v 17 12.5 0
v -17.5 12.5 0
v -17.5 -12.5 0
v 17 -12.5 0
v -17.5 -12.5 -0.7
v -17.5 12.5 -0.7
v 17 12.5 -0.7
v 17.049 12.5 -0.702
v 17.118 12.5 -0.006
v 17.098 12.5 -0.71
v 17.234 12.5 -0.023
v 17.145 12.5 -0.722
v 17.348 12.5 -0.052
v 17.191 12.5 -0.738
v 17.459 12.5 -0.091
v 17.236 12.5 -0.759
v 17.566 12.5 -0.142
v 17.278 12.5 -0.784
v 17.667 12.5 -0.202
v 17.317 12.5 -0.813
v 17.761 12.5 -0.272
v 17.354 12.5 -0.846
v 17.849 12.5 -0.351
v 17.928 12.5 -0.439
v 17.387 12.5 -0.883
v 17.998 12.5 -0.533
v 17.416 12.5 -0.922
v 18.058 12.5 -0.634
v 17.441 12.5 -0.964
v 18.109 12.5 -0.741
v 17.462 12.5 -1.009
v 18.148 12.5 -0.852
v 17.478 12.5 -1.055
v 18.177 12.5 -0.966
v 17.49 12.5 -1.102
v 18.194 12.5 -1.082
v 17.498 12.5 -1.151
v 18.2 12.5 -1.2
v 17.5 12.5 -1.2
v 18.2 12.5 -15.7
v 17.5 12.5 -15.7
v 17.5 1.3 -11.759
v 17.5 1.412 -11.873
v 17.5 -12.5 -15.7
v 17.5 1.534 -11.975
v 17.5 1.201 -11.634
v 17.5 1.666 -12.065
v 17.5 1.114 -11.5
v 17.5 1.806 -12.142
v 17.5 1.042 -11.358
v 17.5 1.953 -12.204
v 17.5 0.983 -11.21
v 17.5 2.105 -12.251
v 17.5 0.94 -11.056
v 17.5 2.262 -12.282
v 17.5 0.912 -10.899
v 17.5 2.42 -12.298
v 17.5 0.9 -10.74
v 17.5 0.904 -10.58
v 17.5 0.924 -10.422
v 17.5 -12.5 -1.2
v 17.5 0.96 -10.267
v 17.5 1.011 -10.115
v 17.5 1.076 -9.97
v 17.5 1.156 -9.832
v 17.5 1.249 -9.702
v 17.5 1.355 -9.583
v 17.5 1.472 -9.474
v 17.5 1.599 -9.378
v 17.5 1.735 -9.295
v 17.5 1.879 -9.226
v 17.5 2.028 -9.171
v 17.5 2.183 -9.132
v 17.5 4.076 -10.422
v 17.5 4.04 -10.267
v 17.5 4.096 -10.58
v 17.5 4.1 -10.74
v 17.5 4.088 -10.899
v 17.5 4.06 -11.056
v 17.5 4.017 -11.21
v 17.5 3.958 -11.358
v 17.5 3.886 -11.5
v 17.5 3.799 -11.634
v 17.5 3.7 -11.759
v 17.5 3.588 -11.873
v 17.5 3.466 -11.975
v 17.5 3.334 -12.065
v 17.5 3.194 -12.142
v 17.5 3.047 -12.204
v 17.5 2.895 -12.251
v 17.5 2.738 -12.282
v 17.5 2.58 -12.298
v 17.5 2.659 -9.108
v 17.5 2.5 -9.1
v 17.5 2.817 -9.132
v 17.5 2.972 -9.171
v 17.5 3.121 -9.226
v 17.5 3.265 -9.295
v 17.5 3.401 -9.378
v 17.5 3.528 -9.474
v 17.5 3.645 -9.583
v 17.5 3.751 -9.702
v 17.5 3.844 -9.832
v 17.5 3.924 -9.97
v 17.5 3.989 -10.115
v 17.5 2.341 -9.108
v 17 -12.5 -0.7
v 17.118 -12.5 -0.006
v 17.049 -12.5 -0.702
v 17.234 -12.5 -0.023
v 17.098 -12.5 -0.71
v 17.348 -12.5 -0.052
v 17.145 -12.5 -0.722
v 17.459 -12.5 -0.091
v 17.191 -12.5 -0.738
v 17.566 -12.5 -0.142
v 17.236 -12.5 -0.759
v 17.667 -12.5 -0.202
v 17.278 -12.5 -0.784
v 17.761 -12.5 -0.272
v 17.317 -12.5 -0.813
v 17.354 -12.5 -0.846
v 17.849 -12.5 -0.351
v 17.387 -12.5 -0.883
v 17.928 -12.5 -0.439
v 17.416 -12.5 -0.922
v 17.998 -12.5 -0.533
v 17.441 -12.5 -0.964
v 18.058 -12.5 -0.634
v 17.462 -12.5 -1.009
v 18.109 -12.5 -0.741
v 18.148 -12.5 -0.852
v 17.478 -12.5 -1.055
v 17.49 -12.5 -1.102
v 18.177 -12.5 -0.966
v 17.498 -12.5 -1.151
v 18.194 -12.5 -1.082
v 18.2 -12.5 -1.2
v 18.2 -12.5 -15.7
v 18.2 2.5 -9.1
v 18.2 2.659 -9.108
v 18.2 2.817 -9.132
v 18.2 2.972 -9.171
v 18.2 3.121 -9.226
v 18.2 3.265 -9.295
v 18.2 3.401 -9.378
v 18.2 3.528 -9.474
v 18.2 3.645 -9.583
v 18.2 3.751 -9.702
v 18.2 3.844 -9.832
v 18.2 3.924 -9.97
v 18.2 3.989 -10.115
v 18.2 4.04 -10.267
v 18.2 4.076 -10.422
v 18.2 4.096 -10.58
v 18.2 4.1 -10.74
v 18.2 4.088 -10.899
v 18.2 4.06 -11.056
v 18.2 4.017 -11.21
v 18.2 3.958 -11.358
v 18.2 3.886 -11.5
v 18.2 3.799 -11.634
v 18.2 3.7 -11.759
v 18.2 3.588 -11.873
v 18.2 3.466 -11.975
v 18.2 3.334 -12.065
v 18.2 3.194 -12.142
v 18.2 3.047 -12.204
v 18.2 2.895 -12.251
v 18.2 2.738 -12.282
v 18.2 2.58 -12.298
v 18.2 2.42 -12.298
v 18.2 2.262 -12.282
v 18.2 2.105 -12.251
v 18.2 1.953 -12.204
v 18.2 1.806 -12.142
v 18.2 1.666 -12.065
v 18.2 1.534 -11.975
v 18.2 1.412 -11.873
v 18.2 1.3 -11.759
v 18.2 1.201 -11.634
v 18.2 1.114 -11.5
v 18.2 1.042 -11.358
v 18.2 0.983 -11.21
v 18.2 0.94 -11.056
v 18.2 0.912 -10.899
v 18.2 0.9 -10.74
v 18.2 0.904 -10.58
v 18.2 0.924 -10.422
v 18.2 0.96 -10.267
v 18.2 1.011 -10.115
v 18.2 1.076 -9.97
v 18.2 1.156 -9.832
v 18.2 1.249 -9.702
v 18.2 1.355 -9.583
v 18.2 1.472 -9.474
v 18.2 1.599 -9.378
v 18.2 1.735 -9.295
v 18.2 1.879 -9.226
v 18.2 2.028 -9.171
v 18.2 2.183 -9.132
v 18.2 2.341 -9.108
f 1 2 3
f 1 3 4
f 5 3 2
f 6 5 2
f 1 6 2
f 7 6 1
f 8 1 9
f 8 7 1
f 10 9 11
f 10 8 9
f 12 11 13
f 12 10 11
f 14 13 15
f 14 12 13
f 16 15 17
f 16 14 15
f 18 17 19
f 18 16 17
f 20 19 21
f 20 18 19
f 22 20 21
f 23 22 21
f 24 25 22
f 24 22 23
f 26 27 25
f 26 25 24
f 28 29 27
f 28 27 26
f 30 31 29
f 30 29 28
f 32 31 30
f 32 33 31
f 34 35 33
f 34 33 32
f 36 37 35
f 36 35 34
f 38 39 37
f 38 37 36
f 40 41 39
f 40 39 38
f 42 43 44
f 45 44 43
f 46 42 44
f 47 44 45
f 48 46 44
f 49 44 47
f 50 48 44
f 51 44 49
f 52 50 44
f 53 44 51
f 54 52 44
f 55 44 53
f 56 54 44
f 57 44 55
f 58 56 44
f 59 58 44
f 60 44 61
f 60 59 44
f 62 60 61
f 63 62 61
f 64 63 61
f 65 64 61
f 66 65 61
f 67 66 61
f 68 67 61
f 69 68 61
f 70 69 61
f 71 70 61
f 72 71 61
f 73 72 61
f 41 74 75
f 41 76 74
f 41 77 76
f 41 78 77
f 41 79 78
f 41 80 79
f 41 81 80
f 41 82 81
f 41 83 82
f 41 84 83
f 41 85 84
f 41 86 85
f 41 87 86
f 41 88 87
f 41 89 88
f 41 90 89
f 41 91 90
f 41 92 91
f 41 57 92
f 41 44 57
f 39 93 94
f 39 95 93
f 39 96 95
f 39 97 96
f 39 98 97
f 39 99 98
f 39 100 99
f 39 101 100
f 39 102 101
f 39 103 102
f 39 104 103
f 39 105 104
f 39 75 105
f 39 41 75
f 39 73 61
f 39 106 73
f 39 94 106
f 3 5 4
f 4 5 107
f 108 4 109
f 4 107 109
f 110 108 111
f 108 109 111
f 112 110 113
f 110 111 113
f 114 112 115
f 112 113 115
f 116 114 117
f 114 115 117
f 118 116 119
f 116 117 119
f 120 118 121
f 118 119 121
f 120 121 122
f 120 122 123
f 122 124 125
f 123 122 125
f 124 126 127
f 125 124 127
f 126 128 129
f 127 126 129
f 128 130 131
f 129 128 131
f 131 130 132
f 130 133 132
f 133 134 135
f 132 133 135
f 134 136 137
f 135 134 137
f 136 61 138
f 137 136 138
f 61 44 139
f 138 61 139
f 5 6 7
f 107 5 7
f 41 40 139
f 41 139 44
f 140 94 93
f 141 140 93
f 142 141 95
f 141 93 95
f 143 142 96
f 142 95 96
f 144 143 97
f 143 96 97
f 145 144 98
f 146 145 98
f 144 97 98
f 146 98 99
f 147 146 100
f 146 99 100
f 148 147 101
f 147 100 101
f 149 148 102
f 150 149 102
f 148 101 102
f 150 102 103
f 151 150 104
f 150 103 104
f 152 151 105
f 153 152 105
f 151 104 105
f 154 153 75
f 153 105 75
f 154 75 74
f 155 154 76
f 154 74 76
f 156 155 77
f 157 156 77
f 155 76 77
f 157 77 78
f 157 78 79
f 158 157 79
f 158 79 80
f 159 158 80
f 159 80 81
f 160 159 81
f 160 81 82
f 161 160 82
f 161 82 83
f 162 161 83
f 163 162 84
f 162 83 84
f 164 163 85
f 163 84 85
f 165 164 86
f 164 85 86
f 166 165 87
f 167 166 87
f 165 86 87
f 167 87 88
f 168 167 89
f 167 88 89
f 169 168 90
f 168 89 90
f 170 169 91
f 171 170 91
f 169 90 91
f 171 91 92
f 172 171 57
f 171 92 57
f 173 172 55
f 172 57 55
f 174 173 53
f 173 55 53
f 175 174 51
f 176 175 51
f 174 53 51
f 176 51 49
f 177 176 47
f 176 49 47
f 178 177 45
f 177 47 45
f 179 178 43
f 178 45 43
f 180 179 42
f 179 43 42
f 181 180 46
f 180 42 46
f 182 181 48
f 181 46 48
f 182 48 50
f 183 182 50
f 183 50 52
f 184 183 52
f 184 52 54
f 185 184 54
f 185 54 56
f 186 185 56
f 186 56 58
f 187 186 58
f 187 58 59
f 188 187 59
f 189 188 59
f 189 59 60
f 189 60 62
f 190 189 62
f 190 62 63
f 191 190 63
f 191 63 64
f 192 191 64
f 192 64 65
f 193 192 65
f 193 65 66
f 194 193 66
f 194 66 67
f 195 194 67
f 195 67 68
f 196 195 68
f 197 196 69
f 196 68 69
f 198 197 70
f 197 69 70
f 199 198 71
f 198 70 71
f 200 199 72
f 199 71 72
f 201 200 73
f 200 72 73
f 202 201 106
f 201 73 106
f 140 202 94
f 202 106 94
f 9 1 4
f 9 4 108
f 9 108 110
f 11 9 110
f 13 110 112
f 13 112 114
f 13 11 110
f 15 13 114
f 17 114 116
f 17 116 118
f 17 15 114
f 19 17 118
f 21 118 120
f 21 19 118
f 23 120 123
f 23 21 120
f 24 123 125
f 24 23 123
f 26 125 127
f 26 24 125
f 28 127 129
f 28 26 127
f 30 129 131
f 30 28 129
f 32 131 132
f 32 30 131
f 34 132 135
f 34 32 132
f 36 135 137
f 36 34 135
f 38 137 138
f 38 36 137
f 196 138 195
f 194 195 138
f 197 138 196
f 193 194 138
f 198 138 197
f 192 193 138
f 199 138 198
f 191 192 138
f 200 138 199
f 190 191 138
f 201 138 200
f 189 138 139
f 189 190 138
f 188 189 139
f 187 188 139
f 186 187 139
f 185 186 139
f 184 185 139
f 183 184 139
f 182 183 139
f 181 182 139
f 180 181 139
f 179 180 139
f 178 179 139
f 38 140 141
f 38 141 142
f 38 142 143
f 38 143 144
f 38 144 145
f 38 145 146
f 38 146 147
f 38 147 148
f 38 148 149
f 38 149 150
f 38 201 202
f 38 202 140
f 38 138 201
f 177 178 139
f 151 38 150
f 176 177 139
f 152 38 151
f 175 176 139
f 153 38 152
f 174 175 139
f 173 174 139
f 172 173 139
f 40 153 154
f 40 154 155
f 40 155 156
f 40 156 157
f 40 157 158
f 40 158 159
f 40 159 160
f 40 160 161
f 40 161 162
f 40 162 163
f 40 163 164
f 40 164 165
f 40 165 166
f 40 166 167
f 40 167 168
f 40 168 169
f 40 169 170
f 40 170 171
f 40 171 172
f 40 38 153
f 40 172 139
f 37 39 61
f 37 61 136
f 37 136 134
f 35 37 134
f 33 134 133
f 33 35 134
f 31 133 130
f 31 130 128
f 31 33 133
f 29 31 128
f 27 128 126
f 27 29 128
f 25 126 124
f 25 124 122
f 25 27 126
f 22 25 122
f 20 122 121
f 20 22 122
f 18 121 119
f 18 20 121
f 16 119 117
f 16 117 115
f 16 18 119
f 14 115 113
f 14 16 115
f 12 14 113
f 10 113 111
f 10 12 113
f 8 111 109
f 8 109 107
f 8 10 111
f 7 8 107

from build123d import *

# Parameters (mm, degrees)
SKETCH1_W                    = 35
SKETCH1_H                    = 25
BASE_FLANGE1_DEPTH           = 0.7
EDGE_FLANGE1_STRIP_W         = 3.8
EDGE_FLANGE1_STRIP_H         = 0.7
EDGE_FLANGE1_STRIP_CUT_DEPTH = 25
EDGE_FLANGE1_DEPTH           = 25
SKETCH10_R                   = 1.6
CUT_EXTRUDE1_DEPTH           = 0.7


# Sheet-metal steps are written as plain solids
with BuildPart() as part:
    # Sketch1 → Base-Flange1 (new body)
    with BuildSketch(Plane.XY):
        Rectangle(SKETCH1_W, SKETCH1_H)
    extrude(amount=-BASE_FLANGE1_DEPTH)

    # Edge-Flange1 strip (across the edge) → Edge-Flange1 strip cut (cut)
    with BuildSketch(Plane(origin=(17.5, 12.5, -0.7), x_dir=(-1, 0, 0), z_dir=(0, -1, 0))):
        with Locations((-1.4, -0.35)):
            Rectangle(EDGE_FLANGE1_STRIP_W, EDGE_FLANGE1_STRIP_H)
    extrude(amount=EDGE_FLANGE1_STRIP_CUT_DEPTH, mode=Mode.SUBTRACT)

    # Edge-Flange1 section (across the edge) → Edge-Flange1 (add)
    with BuildSketch(Plane(origin=(17.5, 12.5, -0.7), x_dir=(-1, 0, 0), z_dir=(0, -1, 0))):
        with BuildLine():
            Line((-0.7, 0.5), (-0.7, 15))
            Line((-0.7, 15), (0, 15))
            Line((0, 15), (0, 0.5))
            ThreePointArc((0, 0.5), (0.146446609, 0.146446609), (0.5, 0))
            Line((0.5, 0), (0.5, -0.7))
            ThreePointArc((0.5, -0.7), (-0.348528137, -0.348528137), (-0.7, 0.5))
        make_face()
    extrude(amount=EDGE_FLANGE1_DEPTH)

    # Sketch10 → Cut-Extrude1 (cut)
    with BuildSketch(Plane.ZY.offset(-17.5)):
        with Locations((-10.7, 2.5)):
            Circle(SKETCH10_R)
    extrude(amount=-CUT_EXTRUDE1_DEPTH, mode=Mode.SUBTRACT)


solid = part.part
